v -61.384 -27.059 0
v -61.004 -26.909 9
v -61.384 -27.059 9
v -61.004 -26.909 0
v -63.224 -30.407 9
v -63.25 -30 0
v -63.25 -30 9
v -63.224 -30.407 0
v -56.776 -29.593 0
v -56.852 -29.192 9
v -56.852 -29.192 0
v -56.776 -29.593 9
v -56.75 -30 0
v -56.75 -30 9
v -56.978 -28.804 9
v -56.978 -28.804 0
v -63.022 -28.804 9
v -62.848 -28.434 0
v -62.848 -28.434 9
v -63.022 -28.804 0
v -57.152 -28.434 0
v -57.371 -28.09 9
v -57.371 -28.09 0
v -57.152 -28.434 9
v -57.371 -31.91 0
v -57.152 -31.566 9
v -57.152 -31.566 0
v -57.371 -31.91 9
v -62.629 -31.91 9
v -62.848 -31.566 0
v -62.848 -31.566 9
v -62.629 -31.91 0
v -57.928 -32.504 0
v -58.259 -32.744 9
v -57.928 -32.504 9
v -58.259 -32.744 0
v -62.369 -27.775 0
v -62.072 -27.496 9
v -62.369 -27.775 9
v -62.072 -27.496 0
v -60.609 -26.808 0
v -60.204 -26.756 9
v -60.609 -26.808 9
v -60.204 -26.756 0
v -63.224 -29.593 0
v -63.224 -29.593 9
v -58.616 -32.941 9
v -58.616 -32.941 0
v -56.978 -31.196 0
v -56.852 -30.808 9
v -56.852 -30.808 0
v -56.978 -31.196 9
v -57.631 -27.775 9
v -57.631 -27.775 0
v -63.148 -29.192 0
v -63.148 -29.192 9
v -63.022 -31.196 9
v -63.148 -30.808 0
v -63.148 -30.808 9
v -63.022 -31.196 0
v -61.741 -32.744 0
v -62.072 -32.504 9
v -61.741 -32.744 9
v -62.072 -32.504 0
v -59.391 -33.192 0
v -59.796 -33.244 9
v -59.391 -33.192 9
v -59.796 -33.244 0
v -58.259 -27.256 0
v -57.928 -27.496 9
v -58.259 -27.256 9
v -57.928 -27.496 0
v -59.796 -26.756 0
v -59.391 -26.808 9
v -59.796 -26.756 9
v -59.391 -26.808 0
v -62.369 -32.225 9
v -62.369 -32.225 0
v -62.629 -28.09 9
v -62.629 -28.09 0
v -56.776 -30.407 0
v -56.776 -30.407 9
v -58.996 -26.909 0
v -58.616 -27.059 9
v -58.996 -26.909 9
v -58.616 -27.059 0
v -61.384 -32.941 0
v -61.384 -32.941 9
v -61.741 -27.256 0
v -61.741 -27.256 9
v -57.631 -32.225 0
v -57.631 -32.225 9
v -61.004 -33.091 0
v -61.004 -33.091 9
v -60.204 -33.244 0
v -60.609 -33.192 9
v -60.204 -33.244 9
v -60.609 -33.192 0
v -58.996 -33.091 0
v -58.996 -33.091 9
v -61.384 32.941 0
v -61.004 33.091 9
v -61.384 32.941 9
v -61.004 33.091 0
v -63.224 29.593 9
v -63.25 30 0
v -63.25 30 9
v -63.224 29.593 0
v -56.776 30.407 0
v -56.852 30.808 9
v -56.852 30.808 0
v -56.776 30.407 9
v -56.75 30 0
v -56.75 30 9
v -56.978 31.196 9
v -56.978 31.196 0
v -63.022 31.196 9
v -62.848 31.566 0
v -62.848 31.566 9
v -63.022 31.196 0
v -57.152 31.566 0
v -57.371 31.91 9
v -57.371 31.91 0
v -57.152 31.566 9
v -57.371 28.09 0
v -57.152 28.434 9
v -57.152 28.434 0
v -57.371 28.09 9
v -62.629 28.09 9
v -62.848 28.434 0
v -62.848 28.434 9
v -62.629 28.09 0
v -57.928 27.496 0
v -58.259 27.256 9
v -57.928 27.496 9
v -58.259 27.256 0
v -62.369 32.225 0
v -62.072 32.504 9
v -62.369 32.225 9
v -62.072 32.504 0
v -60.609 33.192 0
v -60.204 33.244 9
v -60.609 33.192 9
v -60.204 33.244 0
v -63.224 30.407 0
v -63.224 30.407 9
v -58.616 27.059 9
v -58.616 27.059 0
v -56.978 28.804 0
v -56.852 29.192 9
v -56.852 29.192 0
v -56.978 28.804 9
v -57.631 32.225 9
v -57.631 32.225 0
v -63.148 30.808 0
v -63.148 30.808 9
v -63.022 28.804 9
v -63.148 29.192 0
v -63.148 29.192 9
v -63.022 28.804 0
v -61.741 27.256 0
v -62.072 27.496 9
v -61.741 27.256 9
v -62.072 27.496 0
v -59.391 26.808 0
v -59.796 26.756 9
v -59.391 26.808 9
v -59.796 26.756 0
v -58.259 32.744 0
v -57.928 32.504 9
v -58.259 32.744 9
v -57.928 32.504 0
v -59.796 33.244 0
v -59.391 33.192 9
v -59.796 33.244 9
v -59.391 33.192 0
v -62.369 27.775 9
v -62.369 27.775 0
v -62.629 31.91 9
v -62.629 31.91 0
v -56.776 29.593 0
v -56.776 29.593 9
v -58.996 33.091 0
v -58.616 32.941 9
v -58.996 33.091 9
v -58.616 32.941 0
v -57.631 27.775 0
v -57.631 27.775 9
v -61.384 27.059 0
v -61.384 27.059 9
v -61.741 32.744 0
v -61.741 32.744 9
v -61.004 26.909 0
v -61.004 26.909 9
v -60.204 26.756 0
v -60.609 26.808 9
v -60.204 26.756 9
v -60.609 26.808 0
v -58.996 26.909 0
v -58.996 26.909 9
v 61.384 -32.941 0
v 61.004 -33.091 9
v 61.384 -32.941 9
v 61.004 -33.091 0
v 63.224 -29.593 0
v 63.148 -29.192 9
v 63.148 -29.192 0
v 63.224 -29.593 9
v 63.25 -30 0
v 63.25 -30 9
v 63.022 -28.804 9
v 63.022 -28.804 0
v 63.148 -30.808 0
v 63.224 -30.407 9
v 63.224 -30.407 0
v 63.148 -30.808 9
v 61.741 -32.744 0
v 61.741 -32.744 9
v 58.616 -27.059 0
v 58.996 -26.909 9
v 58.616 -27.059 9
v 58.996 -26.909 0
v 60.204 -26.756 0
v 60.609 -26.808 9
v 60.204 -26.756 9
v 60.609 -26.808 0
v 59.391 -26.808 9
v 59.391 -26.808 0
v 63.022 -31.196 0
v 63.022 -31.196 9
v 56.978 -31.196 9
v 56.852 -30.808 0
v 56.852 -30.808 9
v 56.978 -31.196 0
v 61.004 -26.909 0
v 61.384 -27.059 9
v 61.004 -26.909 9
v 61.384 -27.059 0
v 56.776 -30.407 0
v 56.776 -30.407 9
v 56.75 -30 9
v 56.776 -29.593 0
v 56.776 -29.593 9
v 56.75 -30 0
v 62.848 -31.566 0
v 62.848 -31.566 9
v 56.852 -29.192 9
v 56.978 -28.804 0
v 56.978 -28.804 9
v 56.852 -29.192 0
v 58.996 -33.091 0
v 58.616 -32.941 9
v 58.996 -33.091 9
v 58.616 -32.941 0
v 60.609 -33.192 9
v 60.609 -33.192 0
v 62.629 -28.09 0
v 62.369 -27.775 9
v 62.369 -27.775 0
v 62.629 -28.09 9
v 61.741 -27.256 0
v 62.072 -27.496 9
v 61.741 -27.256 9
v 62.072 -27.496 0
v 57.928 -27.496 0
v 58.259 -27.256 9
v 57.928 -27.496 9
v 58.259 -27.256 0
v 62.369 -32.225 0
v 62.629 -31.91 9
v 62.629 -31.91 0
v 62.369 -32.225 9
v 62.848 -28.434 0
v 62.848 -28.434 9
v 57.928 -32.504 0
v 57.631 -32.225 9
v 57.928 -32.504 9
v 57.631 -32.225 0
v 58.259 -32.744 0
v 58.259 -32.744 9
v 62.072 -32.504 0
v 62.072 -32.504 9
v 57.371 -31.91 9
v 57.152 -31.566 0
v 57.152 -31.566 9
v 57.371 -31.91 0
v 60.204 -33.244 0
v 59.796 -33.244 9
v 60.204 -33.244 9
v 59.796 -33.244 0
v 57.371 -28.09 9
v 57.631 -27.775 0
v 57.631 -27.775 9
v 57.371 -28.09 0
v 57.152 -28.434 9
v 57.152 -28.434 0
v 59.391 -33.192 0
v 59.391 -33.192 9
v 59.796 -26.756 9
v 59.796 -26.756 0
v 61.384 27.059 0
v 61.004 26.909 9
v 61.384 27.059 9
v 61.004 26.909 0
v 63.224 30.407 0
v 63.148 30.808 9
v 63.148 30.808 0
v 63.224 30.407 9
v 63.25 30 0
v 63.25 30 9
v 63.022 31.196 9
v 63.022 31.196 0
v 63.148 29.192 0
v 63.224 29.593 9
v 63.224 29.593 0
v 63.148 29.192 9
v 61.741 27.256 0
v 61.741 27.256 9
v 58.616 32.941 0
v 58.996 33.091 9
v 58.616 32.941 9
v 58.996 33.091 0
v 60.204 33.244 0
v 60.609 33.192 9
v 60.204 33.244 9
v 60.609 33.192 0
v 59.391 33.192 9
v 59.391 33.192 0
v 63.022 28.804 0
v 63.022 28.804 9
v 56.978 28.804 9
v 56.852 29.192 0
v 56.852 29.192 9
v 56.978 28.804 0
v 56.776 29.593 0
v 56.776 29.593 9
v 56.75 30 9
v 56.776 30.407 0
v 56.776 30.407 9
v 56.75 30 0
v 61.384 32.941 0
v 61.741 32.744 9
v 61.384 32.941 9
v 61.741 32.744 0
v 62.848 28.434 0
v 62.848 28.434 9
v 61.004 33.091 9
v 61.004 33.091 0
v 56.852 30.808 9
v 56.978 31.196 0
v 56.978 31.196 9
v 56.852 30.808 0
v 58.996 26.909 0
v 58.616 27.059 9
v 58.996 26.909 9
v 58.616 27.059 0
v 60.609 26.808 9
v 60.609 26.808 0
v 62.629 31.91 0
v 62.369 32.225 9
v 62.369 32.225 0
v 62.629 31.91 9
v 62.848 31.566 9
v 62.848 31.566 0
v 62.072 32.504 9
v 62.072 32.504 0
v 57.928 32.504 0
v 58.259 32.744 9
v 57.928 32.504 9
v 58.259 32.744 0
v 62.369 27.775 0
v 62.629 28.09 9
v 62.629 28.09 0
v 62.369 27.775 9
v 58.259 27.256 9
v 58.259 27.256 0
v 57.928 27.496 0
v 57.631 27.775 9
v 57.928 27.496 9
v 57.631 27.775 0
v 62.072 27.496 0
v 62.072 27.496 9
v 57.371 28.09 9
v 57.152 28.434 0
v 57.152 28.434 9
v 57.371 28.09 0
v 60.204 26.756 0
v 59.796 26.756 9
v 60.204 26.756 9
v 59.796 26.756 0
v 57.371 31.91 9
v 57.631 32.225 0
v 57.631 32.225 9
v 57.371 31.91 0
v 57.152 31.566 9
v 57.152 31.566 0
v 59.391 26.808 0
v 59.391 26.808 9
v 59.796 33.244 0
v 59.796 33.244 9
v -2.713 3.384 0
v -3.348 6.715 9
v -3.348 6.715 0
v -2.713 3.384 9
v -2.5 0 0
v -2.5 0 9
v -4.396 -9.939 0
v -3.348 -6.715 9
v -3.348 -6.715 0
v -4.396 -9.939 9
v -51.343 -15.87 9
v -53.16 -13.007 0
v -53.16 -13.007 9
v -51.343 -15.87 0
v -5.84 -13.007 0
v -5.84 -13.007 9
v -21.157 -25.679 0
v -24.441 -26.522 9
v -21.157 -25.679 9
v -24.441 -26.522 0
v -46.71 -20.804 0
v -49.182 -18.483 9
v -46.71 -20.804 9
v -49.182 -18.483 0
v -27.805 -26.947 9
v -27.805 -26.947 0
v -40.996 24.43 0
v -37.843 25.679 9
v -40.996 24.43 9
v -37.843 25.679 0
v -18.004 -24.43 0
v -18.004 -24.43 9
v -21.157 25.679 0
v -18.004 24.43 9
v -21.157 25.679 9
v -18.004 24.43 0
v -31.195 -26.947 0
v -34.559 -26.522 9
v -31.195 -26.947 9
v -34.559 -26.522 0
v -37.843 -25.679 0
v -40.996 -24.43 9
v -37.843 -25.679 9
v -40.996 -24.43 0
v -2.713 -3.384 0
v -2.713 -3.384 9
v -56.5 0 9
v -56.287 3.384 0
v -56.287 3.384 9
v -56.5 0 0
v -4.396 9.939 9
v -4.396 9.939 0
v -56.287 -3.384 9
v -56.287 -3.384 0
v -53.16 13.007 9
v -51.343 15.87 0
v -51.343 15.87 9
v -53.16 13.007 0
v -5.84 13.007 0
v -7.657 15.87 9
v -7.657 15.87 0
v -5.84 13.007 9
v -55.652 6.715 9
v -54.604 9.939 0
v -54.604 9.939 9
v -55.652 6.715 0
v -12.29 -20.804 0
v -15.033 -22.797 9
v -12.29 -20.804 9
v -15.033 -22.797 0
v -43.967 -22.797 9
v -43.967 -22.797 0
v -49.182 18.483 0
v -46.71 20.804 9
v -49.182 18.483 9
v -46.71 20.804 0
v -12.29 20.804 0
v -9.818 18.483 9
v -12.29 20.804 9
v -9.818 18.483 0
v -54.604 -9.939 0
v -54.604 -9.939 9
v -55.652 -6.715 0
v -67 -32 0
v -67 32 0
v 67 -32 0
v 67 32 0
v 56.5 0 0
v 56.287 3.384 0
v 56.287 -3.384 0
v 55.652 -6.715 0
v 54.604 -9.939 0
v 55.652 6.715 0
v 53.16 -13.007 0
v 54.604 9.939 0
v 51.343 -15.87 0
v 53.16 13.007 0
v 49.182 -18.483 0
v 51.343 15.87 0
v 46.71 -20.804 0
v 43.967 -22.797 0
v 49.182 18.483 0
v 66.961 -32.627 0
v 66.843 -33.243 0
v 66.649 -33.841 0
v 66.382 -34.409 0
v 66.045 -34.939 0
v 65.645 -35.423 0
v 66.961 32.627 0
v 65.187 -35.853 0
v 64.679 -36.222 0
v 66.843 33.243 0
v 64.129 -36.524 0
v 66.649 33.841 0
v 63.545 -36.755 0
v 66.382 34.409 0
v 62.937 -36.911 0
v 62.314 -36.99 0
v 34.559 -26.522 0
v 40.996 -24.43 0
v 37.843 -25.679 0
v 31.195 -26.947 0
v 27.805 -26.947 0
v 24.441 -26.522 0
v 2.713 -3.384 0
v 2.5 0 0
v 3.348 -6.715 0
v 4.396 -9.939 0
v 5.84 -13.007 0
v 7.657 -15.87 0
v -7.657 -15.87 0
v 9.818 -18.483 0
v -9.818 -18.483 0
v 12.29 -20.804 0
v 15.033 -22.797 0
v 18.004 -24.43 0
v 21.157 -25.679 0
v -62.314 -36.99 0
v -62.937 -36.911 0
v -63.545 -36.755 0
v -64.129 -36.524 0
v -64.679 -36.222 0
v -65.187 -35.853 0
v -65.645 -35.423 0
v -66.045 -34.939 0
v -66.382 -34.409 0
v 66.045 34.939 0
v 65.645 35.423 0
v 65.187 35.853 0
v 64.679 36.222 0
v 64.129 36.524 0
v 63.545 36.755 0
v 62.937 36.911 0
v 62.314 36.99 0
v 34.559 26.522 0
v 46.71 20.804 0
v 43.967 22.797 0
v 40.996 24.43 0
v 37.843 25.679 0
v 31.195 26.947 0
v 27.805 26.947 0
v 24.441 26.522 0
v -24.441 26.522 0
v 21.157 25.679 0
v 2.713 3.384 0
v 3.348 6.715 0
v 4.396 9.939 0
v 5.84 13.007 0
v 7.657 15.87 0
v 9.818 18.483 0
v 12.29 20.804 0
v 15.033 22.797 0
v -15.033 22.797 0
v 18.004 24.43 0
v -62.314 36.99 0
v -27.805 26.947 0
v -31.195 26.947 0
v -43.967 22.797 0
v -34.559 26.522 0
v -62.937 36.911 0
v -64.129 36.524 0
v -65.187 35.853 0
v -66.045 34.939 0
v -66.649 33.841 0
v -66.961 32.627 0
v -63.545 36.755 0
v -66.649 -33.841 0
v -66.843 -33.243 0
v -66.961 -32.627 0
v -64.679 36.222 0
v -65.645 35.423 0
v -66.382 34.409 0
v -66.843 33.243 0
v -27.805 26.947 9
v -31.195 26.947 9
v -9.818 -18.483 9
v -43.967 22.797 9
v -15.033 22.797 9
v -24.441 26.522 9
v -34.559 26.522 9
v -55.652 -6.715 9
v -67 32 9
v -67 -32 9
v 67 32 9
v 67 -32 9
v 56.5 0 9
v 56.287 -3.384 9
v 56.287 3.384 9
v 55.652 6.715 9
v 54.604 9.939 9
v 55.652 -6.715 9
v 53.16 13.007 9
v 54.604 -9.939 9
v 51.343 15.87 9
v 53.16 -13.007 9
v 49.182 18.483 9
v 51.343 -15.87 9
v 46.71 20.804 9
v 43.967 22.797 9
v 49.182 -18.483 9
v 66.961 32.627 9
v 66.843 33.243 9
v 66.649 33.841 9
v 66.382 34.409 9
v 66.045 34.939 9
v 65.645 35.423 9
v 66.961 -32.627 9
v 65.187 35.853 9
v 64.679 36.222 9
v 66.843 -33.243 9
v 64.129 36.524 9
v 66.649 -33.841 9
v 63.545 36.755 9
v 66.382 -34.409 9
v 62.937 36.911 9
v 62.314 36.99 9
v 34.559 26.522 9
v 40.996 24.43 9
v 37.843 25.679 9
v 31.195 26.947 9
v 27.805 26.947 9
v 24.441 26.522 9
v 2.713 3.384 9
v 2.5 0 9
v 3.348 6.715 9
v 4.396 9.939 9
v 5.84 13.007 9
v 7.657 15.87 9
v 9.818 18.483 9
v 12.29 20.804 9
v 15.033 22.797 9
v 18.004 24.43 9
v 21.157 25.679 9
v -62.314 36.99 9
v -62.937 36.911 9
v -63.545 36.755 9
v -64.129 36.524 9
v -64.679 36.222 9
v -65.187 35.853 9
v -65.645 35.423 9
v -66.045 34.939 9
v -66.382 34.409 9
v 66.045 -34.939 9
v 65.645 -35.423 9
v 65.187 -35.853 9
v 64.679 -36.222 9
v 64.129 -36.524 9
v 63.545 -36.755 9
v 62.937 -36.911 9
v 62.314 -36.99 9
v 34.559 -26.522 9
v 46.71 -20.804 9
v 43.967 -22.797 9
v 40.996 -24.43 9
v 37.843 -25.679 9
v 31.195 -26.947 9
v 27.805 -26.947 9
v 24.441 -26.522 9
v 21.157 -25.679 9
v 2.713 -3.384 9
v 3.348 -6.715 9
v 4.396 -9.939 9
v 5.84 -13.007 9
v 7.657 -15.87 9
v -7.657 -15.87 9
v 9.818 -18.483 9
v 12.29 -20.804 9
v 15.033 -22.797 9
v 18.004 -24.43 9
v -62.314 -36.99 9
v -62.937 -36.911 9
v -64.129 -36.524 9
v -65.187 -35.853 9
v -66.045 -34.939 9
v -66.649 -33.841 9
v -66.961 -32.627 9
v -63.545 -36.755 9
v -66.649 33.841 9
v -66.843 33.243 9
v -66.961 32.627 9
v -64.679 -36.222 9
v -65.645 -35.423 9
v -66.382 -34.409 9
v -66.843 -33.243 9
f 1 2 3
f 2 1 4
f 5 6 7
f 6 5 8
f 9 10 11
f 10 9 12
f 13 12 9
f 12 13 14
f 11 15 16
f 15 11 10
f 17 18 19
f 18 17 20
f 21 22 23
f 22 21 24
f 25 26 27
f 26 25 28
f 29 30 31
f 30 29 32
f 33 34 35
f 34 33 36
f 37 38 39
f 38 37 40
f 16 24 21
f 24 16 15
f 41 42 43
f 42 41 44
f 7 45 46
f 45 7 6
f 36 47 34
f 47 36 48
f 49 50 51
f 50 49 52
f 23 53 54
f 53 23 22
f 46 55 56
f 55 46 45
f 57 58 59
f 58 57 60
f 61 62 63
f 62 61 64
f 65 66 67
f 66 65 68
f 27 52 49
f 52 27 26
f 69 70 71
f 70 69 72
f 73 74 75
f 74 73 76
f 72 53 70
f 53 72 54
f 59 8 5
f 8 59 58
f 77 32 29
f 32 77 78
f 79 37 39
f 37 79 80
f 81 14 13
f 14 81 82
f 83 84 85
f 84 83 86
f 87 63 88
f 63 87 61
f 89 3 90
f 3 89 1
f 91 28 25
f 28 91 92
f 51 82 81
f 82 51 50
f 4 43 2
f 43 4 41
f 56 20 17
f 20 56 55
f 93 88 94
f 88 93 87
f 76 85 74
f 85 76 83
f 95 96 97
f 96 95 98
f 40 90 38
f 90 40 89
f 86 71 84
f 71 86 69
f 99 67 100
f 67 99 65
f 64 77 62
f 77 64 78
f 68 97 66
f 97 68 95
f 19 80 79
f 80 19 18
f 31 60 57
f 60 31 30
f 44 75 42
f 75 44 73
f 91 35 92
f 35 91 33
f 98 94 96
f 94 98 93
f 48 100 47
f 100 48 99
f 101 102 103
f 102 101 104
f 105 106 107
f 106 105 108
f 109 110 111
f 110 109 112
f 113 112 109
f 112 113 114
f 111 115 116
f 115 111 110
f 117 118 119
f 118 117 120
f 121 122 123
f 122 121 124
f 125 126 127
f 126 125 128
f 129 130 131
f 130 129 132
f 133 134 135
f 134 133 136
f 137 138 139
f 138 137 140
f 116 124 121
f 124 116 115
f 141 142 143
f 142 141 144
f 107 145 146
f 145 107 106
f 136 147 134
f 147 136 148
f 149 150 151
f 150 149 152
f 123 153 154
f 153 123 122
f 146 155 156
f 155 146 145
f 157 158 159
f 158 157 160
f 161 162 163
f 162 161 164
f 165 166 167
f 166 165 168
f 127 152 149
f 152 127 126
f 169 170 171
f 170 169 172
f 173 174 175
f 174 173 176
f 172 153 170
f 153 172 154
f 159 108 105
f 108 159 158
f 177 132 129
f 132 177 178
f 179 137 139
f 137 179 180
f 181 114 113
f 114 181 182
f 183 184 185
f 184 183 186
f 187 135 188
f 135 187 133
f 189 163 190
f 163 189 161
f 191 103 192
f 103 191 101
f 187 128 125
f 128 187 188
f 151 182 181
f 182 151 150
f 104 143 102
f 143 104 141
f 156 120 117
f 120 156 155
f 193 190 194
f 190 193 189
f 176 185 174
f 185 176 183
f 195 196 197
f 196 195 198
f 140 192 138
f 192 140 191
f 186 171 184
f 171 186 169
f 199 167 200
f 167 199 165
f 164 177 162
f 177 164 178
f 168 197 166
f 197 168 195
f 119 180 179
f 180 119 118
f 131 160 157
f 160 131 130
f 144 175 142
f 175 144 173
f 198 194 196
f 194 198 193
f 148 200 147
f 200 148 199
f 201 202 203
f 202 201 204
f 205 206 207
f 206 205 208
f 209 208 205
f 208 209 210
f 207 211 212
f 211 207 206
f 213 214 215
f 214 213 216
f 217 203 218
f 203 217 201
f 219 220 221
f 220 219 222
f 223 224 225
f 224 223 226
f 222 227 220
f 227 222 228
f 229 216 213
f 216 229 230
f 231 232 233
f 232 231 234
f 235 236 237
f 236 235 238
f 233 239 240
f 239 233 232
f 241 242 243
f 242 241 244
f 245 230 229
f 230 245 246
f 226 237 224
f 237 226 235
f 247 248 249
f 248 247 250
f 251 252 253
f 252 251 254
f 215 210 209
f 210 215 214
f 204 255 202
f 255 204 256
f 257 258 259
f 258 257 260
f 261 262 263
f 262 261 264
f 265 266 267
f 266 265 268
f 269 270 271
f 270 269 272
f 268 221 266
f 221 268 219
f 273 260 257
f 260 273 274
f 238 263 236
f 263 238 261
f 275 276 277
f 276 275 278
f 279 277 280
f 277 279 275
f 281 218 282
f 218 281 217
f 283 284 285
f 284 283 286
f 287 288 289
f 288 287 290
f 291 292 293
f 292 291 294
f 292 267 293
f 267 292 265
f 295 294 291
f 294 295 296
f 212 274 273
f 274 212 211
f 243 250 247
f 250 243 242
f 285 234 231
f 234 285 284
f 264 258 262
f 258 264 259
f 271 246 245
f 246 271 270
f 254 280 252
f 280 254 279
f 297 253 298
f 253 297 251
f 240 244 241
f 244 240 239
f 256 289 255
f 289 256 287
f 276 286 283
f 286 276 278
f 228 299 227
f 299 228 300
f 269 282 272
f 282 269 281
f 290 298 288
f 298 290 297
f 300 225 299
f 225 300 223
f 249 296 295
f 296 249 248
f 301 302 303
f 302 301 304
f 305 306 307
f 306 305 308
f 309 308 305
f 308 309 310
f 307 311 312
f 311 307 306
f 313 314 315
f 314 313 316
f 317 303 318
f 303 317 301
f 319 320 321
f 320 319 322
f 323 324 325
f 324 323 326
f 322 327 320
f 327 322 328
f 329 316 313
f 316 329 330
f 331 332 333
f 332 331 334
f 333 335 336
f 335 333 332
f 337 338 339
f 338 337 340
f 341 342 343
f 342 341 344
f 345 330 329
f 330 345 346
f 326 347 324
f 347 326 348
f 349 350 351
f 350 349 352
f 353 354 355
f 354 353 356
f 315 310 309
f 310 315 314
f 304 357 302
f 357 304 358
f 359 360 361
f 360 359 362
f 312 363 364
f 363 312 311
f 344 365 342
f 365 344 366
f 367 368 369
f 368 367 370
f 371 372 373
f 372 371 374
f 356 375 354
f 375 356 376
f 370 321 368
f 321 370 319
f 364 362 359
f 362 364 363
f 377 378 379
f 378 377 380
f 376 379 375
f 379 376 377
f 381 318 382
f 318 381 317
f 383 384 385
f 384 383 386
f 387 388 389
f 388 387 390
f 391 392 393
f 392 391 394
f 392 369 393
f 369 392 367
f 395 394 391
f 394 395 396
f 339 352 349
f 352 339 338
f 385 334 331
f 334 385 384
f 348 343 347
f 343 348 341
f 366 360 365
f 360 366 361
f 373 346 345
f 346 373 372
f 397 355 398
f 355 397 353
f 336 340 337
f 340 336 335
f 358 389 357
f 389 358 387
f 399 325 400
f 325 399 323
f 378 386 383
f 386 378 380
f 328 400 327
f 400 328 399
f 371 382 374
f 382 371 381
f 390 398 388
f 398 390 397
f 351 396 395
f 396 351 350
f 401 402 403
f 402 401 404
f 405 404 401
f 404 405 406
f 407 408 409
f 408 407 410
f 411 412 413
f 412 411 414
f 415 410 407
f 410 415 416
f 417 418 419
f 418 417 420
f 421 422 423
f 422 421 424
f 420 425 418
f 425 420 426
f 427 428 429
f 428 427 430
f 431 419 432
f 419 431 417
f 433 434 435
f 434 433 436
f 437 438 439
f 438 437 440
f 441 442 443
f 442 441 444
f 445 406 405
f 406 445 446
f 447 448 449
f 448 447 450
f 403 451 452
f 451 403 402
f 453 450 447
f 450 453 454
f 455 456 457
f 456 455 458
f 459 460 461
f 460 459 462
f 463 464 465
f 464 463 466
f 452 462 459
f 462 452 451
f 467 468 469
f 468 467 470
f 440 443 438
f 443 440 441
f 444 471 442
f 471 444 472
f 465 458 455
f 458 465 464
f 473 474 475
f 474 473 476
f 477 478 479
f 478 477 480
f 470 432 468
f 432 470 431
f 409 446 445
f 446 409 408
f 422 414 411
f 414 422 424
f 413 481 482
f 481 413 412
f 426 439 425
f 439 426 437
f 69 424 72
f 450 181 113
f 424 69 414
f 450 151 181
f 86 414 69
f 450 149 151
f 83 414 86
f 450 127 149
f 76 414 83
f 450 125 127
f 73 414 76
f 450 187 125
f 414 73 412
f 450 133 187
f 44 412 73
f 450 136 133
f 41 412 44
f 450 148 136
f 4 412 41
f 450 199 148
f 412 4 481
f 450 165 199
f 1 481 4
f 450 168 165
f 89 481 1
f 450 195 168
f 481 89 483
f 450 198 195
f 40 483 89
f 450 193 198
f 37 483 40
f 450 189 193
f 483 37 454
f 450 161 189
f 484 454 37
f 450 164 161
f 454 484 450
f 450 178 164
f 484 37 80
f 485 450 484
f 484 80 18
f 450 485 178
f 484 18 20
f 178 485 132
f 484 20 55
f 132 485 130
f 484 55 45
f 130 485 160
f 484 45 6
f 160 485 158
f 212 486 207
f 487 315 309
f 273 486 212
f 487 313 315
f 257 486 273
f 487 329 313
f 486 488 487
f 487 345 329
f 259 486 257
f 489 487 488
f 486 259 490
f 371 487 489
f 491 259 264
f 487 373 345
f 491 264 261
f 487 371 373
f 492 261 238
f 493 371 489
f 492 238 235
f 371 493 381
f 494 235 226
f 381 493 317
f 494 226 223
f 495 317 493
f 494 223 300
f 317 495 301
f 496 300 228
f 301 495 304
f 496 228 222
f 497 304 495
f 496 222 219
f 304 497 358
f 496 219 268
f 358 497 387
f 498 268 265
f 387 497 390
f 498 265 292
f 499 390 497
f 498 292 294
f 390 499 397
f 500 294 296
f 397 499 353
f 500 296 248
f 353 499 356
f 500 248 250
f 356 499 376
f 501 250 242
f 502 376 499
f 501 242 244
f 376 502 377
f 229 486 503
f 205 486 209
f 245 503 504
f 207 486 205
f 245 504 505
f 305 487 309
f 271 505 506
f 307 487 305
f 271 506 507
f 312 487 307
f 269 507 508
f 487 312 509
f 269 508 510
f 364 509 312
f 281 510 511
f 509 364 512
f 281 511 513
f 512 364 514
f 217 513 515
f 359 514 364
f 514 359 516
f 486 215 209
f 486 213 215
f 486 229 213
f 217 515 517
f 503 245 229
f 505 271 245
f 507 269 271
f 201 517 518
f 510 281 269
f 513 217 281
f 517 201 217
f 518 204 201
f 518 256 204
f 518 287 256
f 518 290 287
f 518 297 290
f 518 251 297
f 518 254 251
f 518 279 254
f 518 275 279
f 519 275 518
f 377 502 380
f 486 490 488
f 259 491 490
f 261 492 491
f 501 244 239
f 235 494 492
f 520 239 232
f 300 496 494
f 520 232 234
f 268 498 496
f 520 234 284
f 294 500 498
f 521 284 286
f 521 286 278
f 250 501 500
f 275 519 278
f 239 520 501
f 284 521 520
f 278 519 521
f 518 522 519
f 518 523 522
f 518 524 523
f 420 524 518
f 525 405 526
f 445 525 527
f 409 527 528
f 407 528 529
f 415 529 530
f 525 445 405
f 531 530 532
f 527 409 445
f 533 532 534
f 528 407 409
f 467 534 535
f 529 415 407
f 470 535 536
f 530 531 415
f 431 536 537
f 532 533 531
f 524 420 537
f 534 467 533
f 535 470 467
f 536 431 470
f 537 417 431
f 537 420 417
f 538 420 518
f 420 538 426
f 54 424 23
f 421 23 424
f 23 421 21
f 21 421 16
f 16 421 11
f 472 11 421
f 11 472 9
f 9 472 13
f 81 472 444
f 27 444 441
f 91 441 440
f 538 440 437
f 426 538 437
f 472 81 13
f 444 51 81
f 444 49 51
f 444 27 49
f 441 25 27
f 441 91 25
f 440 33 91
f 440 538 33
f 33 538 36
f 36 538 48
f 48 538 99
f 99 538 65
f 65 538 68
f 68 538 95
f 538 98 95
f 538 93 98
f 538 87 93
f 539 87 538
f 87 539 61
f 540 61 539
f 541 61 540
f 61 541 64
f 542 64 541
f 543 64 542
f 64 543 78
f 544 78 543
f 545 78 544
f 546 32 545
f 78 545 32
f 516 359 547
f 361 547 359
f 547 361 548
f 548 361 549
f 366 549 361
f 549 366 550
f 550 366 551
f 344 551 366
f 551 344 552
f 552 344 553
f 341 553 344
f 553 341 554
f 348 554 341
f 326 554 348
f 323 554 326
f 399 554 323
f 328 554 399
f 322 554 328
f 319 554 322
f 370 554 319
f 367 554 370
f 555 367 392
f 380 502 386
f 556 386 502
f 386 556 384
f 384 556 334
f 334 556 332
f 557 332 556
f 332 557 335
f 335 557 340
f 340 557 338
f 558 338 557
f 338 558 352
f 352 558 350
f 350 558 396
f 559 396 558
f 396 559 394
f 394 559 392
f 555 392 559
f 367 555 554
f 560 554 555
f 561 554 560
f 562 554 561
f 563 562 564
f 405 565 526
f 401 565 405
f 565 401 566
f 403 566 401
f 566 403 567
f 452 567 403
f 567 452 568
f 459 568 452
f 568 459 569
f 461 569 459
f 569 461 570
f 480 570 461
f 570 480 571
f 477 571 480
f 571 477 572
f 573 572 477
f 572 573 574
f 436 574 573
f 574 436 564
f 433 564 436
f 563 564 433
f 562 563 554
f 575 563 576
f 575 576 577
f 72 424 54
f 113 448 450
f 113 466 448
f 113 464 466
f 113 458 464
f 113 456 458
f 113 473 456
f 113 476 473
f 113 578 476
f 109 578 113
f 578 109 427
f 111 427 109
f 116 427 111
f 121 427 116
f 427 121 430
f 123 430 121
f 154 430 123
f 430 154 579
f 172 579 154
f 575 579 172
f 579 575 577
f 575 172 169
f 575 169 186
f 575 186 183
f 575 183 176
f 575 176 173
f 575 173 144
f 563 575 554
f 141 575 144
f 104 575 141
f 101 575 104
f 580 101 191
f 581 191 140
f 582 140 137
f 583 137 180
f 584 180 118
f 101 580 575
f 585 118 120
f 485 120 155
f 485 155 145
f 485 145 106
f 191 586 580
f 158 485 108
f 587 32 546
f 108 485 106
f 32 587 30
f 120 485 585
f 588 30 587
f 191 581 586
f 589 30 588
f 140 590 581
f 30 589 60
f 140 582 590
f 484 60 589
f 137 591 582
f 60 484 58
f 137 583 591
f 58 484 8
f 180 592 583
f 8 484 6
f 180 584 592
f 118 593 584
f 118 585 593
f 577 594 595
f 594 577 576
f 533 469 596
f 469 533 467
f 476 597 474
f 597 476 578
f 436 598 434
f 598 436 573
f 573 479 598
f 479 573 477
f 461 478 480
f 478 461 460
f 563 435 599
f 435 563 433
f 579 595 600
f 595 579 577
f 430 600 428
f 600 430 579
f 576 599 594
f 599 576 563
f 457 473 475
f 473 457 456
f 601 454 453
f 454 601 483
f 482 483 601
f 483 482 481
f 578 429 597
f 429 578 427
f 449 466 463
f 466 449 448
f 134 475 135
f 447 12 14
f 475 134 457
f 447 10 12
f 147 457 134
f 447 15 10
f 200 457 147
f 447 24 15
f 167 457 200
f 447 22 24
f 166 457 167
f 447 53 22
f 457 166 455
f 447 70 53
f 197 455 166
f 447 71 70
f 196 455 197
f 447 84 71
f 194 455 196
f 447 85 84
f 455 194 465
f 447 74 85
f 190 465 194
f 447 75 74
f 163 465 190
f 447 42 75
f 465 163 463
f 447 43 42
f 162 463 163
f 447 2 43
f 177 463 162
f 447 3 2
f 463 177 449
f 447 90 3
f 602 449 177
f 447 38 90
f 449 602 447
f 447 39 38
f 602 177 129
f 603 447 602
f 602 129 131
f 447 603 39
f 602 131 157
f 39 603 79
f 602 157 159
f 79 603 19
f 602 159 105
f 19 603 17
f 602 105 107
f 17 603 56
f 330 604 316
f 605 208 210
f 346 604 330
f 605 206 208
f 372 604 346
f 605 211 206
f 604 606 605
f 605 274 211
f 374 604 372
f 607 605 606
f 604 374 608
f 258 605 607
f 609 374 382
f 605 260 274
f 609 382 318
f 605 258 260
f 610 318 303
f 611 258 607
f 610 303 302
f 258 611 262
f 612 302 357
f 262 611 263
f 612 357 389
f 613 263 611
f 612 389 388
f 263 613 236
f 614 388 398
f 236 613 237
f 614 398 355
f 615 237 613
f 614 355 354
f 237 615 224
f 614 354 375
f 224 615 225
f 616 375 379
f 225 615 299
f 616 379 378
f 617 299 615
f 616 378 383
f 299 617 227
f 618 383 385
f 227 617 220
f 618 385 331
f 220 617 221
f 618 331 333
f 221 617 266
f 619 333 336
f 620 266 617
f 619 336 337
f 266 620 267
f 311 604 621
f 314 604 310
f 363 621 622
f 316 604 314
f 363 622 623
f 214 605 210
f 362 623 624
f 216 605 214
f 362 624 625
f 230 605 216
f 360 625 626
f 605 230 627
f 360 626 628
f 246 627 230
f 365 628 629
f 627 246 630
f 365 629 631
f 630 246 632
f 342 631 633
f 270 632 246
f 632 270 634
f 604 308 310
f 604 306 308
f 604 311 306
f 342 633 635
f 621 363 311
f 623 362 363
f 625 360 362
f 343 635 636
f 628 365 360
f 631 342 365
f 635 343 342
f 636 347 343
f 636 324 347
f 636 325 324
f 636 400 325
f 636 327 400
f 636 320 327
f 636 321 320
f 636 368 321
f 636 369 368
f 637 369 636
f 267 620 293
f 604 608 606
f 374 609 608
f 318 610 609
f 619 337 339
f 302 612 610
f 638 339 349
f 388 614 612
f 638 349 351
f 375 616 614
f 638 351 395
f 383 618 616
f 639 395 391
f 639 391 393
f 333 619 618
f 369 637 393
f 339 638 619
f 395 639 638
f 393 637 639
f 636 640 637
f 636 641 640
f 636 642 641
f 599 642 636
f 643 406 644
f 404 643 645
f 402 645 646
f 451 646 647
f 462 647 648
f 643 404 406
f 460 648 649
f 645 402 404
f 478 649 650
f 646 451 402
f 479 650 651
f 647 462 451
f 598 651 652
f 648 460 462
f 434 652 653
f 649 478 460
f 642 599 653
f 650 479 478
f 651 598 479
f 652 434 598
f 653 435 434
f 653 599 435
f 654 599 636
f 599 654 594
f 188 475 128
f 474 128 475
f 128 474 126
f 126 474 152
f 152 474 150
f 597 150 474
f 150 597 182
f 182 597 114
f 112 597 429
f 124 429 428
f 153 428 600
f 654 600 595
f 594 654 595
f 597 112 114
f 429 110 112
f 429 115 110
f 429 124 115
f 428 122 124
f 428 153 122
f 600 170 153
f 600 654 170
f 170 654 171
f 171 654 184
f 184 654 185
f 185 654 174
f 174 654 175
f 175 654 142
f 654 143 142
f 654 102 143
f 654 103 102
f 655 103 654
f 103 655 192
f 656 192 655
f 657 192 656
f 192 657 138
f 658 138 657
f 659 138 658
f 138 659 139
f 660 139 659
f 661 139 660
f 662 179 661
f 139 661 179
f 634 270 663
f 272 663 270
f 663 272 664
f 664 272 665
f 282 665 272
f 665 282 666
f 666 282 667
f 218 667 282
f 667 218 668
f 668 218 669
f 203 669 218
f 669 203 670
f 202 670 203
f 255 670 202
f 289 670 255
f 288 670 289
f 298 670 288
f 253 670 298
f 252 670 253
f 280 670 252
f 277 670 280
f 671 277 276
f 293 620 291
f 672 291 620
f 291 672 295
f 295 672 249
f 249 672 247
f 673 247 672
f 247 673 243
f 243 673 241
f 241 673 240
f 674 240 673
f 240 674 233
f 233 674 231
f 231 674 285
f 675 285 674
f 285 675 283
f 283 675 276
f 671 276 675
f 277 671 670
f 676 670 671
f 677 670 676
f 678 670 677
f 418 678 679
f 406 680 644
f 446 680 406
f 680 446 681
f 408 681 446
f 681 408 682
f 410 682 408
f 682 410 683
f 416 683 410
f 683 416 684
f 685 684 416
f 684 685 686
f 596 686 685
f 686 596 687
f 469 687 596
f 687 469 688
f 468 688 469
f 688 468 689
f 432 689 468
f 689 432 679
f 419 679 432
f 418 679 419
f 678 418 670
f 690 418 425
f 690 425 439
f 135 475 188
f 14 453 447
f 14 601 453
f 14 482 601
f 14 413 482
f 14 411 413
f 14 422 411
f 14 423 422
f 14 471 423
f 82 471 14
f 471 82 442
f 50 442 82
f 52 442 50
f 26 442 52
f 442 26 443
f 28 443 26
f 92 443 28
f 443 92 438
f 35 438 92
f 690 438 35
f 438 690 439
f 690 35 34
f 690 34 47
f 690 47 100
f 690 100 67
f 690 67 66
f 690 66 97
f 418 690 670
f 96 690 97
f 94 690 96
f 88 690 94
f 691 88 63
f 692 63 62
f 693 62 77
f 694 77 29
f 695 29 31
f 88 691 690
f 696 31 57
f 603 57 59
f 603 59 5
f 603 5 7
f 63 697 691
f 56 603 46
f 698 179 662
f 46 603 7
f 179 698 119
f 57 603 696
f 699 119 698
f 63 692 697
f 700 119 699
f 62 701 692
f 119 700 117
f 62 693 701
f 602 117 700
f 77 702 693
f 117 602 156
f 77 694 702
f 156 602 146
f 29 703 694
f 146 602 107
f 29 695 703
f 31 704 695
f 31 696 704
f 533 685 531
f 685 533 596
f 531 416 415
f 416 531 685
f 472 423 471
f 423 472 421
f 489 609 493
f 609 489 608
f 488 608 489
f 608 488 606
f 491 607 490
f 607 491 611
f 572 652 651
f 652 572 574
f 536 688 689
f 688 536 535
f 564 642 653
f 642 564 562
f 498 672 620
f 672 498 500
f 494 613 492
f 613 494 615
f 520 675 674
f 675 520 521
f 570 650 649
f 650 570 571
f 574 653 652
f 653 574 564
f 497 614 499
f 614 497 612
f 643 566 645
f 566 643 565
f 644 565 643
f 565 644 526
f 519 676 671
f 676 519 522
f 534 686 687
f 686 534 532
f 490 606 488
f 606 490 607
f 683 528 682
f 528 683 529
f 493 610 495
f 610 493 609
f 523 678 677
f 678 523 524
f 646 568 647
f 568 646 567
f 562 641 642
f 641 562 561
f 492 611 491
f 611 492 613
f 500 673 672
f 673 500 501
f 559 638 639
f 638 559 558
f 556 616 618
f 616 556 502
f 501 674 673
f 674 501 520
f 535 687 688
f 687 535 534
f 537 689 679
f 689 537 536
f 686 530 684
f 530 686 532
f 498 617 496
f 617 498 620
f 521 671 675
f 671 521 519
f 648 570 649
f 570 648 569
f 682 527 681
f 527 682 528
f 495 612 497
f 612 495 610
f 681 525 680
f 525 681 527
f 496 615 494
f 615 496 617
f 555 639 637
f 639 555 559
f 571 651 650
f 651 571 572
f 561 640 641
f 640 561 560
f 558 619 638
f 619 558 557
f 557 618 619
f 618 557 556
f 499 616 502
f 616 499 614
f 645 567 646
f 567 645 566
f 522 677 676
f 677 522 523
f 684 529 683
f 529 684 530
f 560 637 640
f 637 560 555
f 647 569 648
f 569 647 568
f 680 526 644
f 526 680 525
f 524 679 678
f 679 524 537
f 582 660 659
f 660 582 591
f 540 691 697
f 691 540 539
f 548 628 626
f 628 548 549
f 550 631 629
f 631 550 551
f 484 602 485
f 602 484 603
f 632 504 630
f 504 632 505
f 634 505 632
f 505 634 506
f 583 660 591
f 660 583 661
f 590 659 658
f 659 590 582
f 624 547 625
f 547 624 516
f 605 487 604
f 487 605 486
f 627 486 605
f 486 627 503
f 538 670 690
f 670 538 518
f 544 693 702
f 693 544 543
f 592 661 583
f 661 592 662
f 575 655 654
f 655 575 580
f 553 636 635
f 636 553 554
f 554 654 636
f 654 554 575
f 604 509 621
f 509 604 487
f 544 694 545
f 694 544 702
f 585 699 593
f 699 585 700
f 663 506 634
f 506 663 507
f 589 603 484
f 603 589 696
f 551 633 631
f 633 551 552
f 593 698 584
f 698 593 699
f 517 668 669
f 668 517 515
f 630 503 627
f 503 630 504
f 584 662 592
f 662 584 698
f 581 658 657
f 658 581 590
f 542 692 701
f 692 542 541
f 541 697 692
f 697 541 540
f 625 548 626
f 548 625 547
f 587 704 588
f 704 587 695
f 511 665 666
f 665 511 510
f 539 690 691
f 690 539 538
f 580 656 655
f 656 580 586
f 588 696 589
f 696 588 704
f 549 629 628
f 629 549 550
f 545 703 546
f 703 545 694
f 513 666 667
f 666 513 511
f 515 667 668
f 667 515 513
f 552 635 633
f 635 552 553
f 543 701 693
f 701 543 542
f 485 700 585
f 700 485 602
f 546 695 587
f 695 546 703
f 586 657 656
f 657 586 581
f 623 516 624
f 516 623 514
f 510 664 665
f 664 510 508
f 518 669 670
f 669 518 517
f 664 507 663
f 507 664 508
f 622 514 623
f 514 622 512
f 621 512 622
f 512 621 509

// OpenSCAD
$fn = 50;


difference() {
	union() {
		hull() {
			translate(v = [-62.0000000000, 32.0000000000, 0]) {
				cylinder(h = 9, r = 5);
			}
			translate(v = [62.0000000000, 32.0000000000, 0]) {
				cylinder(h = 9, r = 5);
			}
			translate(v = [-62.0000000000, -32.0000000000, 0]) {
				cylinder(h = 9, r = 5);
			}
			translate(v = [62.0000000000, -32.0000000000, 0]) {
				cylinder(h = 9, r = 5);
			}
		}
	}
	union() {
		#translate(v = [-60.0000000000, -30.0000000000, -100.0000000000]) {
			cylinder(h = 200, r = 3.2500000000);
		}
		#translate(v = [-60.0000000000, 30.0000000000, -100.0000000000]) {
			cylinder(h = 200, r = 3.2500000000);
		}
		#translate(v = [60.0000000000, -30.0000000000, -100.0000000000]) {
			cylinder(h = 200, r = 3.2500000000);
		}
		#translate(v = [60.0000000000, 30.0000000000, -100.0000000000]) {
			cylinder(h = 200, r = 3.2500000000);
		}
		#translate(v = [-29.5000000000, 0, 0]) {
			cylinder(h = 9, r = 27.0000000000);
		}
		#translate(v = [29.5000000000, 0, 0]) {
			cylinder(h = 9, r = 27.0000000000);
		}
	}
}
